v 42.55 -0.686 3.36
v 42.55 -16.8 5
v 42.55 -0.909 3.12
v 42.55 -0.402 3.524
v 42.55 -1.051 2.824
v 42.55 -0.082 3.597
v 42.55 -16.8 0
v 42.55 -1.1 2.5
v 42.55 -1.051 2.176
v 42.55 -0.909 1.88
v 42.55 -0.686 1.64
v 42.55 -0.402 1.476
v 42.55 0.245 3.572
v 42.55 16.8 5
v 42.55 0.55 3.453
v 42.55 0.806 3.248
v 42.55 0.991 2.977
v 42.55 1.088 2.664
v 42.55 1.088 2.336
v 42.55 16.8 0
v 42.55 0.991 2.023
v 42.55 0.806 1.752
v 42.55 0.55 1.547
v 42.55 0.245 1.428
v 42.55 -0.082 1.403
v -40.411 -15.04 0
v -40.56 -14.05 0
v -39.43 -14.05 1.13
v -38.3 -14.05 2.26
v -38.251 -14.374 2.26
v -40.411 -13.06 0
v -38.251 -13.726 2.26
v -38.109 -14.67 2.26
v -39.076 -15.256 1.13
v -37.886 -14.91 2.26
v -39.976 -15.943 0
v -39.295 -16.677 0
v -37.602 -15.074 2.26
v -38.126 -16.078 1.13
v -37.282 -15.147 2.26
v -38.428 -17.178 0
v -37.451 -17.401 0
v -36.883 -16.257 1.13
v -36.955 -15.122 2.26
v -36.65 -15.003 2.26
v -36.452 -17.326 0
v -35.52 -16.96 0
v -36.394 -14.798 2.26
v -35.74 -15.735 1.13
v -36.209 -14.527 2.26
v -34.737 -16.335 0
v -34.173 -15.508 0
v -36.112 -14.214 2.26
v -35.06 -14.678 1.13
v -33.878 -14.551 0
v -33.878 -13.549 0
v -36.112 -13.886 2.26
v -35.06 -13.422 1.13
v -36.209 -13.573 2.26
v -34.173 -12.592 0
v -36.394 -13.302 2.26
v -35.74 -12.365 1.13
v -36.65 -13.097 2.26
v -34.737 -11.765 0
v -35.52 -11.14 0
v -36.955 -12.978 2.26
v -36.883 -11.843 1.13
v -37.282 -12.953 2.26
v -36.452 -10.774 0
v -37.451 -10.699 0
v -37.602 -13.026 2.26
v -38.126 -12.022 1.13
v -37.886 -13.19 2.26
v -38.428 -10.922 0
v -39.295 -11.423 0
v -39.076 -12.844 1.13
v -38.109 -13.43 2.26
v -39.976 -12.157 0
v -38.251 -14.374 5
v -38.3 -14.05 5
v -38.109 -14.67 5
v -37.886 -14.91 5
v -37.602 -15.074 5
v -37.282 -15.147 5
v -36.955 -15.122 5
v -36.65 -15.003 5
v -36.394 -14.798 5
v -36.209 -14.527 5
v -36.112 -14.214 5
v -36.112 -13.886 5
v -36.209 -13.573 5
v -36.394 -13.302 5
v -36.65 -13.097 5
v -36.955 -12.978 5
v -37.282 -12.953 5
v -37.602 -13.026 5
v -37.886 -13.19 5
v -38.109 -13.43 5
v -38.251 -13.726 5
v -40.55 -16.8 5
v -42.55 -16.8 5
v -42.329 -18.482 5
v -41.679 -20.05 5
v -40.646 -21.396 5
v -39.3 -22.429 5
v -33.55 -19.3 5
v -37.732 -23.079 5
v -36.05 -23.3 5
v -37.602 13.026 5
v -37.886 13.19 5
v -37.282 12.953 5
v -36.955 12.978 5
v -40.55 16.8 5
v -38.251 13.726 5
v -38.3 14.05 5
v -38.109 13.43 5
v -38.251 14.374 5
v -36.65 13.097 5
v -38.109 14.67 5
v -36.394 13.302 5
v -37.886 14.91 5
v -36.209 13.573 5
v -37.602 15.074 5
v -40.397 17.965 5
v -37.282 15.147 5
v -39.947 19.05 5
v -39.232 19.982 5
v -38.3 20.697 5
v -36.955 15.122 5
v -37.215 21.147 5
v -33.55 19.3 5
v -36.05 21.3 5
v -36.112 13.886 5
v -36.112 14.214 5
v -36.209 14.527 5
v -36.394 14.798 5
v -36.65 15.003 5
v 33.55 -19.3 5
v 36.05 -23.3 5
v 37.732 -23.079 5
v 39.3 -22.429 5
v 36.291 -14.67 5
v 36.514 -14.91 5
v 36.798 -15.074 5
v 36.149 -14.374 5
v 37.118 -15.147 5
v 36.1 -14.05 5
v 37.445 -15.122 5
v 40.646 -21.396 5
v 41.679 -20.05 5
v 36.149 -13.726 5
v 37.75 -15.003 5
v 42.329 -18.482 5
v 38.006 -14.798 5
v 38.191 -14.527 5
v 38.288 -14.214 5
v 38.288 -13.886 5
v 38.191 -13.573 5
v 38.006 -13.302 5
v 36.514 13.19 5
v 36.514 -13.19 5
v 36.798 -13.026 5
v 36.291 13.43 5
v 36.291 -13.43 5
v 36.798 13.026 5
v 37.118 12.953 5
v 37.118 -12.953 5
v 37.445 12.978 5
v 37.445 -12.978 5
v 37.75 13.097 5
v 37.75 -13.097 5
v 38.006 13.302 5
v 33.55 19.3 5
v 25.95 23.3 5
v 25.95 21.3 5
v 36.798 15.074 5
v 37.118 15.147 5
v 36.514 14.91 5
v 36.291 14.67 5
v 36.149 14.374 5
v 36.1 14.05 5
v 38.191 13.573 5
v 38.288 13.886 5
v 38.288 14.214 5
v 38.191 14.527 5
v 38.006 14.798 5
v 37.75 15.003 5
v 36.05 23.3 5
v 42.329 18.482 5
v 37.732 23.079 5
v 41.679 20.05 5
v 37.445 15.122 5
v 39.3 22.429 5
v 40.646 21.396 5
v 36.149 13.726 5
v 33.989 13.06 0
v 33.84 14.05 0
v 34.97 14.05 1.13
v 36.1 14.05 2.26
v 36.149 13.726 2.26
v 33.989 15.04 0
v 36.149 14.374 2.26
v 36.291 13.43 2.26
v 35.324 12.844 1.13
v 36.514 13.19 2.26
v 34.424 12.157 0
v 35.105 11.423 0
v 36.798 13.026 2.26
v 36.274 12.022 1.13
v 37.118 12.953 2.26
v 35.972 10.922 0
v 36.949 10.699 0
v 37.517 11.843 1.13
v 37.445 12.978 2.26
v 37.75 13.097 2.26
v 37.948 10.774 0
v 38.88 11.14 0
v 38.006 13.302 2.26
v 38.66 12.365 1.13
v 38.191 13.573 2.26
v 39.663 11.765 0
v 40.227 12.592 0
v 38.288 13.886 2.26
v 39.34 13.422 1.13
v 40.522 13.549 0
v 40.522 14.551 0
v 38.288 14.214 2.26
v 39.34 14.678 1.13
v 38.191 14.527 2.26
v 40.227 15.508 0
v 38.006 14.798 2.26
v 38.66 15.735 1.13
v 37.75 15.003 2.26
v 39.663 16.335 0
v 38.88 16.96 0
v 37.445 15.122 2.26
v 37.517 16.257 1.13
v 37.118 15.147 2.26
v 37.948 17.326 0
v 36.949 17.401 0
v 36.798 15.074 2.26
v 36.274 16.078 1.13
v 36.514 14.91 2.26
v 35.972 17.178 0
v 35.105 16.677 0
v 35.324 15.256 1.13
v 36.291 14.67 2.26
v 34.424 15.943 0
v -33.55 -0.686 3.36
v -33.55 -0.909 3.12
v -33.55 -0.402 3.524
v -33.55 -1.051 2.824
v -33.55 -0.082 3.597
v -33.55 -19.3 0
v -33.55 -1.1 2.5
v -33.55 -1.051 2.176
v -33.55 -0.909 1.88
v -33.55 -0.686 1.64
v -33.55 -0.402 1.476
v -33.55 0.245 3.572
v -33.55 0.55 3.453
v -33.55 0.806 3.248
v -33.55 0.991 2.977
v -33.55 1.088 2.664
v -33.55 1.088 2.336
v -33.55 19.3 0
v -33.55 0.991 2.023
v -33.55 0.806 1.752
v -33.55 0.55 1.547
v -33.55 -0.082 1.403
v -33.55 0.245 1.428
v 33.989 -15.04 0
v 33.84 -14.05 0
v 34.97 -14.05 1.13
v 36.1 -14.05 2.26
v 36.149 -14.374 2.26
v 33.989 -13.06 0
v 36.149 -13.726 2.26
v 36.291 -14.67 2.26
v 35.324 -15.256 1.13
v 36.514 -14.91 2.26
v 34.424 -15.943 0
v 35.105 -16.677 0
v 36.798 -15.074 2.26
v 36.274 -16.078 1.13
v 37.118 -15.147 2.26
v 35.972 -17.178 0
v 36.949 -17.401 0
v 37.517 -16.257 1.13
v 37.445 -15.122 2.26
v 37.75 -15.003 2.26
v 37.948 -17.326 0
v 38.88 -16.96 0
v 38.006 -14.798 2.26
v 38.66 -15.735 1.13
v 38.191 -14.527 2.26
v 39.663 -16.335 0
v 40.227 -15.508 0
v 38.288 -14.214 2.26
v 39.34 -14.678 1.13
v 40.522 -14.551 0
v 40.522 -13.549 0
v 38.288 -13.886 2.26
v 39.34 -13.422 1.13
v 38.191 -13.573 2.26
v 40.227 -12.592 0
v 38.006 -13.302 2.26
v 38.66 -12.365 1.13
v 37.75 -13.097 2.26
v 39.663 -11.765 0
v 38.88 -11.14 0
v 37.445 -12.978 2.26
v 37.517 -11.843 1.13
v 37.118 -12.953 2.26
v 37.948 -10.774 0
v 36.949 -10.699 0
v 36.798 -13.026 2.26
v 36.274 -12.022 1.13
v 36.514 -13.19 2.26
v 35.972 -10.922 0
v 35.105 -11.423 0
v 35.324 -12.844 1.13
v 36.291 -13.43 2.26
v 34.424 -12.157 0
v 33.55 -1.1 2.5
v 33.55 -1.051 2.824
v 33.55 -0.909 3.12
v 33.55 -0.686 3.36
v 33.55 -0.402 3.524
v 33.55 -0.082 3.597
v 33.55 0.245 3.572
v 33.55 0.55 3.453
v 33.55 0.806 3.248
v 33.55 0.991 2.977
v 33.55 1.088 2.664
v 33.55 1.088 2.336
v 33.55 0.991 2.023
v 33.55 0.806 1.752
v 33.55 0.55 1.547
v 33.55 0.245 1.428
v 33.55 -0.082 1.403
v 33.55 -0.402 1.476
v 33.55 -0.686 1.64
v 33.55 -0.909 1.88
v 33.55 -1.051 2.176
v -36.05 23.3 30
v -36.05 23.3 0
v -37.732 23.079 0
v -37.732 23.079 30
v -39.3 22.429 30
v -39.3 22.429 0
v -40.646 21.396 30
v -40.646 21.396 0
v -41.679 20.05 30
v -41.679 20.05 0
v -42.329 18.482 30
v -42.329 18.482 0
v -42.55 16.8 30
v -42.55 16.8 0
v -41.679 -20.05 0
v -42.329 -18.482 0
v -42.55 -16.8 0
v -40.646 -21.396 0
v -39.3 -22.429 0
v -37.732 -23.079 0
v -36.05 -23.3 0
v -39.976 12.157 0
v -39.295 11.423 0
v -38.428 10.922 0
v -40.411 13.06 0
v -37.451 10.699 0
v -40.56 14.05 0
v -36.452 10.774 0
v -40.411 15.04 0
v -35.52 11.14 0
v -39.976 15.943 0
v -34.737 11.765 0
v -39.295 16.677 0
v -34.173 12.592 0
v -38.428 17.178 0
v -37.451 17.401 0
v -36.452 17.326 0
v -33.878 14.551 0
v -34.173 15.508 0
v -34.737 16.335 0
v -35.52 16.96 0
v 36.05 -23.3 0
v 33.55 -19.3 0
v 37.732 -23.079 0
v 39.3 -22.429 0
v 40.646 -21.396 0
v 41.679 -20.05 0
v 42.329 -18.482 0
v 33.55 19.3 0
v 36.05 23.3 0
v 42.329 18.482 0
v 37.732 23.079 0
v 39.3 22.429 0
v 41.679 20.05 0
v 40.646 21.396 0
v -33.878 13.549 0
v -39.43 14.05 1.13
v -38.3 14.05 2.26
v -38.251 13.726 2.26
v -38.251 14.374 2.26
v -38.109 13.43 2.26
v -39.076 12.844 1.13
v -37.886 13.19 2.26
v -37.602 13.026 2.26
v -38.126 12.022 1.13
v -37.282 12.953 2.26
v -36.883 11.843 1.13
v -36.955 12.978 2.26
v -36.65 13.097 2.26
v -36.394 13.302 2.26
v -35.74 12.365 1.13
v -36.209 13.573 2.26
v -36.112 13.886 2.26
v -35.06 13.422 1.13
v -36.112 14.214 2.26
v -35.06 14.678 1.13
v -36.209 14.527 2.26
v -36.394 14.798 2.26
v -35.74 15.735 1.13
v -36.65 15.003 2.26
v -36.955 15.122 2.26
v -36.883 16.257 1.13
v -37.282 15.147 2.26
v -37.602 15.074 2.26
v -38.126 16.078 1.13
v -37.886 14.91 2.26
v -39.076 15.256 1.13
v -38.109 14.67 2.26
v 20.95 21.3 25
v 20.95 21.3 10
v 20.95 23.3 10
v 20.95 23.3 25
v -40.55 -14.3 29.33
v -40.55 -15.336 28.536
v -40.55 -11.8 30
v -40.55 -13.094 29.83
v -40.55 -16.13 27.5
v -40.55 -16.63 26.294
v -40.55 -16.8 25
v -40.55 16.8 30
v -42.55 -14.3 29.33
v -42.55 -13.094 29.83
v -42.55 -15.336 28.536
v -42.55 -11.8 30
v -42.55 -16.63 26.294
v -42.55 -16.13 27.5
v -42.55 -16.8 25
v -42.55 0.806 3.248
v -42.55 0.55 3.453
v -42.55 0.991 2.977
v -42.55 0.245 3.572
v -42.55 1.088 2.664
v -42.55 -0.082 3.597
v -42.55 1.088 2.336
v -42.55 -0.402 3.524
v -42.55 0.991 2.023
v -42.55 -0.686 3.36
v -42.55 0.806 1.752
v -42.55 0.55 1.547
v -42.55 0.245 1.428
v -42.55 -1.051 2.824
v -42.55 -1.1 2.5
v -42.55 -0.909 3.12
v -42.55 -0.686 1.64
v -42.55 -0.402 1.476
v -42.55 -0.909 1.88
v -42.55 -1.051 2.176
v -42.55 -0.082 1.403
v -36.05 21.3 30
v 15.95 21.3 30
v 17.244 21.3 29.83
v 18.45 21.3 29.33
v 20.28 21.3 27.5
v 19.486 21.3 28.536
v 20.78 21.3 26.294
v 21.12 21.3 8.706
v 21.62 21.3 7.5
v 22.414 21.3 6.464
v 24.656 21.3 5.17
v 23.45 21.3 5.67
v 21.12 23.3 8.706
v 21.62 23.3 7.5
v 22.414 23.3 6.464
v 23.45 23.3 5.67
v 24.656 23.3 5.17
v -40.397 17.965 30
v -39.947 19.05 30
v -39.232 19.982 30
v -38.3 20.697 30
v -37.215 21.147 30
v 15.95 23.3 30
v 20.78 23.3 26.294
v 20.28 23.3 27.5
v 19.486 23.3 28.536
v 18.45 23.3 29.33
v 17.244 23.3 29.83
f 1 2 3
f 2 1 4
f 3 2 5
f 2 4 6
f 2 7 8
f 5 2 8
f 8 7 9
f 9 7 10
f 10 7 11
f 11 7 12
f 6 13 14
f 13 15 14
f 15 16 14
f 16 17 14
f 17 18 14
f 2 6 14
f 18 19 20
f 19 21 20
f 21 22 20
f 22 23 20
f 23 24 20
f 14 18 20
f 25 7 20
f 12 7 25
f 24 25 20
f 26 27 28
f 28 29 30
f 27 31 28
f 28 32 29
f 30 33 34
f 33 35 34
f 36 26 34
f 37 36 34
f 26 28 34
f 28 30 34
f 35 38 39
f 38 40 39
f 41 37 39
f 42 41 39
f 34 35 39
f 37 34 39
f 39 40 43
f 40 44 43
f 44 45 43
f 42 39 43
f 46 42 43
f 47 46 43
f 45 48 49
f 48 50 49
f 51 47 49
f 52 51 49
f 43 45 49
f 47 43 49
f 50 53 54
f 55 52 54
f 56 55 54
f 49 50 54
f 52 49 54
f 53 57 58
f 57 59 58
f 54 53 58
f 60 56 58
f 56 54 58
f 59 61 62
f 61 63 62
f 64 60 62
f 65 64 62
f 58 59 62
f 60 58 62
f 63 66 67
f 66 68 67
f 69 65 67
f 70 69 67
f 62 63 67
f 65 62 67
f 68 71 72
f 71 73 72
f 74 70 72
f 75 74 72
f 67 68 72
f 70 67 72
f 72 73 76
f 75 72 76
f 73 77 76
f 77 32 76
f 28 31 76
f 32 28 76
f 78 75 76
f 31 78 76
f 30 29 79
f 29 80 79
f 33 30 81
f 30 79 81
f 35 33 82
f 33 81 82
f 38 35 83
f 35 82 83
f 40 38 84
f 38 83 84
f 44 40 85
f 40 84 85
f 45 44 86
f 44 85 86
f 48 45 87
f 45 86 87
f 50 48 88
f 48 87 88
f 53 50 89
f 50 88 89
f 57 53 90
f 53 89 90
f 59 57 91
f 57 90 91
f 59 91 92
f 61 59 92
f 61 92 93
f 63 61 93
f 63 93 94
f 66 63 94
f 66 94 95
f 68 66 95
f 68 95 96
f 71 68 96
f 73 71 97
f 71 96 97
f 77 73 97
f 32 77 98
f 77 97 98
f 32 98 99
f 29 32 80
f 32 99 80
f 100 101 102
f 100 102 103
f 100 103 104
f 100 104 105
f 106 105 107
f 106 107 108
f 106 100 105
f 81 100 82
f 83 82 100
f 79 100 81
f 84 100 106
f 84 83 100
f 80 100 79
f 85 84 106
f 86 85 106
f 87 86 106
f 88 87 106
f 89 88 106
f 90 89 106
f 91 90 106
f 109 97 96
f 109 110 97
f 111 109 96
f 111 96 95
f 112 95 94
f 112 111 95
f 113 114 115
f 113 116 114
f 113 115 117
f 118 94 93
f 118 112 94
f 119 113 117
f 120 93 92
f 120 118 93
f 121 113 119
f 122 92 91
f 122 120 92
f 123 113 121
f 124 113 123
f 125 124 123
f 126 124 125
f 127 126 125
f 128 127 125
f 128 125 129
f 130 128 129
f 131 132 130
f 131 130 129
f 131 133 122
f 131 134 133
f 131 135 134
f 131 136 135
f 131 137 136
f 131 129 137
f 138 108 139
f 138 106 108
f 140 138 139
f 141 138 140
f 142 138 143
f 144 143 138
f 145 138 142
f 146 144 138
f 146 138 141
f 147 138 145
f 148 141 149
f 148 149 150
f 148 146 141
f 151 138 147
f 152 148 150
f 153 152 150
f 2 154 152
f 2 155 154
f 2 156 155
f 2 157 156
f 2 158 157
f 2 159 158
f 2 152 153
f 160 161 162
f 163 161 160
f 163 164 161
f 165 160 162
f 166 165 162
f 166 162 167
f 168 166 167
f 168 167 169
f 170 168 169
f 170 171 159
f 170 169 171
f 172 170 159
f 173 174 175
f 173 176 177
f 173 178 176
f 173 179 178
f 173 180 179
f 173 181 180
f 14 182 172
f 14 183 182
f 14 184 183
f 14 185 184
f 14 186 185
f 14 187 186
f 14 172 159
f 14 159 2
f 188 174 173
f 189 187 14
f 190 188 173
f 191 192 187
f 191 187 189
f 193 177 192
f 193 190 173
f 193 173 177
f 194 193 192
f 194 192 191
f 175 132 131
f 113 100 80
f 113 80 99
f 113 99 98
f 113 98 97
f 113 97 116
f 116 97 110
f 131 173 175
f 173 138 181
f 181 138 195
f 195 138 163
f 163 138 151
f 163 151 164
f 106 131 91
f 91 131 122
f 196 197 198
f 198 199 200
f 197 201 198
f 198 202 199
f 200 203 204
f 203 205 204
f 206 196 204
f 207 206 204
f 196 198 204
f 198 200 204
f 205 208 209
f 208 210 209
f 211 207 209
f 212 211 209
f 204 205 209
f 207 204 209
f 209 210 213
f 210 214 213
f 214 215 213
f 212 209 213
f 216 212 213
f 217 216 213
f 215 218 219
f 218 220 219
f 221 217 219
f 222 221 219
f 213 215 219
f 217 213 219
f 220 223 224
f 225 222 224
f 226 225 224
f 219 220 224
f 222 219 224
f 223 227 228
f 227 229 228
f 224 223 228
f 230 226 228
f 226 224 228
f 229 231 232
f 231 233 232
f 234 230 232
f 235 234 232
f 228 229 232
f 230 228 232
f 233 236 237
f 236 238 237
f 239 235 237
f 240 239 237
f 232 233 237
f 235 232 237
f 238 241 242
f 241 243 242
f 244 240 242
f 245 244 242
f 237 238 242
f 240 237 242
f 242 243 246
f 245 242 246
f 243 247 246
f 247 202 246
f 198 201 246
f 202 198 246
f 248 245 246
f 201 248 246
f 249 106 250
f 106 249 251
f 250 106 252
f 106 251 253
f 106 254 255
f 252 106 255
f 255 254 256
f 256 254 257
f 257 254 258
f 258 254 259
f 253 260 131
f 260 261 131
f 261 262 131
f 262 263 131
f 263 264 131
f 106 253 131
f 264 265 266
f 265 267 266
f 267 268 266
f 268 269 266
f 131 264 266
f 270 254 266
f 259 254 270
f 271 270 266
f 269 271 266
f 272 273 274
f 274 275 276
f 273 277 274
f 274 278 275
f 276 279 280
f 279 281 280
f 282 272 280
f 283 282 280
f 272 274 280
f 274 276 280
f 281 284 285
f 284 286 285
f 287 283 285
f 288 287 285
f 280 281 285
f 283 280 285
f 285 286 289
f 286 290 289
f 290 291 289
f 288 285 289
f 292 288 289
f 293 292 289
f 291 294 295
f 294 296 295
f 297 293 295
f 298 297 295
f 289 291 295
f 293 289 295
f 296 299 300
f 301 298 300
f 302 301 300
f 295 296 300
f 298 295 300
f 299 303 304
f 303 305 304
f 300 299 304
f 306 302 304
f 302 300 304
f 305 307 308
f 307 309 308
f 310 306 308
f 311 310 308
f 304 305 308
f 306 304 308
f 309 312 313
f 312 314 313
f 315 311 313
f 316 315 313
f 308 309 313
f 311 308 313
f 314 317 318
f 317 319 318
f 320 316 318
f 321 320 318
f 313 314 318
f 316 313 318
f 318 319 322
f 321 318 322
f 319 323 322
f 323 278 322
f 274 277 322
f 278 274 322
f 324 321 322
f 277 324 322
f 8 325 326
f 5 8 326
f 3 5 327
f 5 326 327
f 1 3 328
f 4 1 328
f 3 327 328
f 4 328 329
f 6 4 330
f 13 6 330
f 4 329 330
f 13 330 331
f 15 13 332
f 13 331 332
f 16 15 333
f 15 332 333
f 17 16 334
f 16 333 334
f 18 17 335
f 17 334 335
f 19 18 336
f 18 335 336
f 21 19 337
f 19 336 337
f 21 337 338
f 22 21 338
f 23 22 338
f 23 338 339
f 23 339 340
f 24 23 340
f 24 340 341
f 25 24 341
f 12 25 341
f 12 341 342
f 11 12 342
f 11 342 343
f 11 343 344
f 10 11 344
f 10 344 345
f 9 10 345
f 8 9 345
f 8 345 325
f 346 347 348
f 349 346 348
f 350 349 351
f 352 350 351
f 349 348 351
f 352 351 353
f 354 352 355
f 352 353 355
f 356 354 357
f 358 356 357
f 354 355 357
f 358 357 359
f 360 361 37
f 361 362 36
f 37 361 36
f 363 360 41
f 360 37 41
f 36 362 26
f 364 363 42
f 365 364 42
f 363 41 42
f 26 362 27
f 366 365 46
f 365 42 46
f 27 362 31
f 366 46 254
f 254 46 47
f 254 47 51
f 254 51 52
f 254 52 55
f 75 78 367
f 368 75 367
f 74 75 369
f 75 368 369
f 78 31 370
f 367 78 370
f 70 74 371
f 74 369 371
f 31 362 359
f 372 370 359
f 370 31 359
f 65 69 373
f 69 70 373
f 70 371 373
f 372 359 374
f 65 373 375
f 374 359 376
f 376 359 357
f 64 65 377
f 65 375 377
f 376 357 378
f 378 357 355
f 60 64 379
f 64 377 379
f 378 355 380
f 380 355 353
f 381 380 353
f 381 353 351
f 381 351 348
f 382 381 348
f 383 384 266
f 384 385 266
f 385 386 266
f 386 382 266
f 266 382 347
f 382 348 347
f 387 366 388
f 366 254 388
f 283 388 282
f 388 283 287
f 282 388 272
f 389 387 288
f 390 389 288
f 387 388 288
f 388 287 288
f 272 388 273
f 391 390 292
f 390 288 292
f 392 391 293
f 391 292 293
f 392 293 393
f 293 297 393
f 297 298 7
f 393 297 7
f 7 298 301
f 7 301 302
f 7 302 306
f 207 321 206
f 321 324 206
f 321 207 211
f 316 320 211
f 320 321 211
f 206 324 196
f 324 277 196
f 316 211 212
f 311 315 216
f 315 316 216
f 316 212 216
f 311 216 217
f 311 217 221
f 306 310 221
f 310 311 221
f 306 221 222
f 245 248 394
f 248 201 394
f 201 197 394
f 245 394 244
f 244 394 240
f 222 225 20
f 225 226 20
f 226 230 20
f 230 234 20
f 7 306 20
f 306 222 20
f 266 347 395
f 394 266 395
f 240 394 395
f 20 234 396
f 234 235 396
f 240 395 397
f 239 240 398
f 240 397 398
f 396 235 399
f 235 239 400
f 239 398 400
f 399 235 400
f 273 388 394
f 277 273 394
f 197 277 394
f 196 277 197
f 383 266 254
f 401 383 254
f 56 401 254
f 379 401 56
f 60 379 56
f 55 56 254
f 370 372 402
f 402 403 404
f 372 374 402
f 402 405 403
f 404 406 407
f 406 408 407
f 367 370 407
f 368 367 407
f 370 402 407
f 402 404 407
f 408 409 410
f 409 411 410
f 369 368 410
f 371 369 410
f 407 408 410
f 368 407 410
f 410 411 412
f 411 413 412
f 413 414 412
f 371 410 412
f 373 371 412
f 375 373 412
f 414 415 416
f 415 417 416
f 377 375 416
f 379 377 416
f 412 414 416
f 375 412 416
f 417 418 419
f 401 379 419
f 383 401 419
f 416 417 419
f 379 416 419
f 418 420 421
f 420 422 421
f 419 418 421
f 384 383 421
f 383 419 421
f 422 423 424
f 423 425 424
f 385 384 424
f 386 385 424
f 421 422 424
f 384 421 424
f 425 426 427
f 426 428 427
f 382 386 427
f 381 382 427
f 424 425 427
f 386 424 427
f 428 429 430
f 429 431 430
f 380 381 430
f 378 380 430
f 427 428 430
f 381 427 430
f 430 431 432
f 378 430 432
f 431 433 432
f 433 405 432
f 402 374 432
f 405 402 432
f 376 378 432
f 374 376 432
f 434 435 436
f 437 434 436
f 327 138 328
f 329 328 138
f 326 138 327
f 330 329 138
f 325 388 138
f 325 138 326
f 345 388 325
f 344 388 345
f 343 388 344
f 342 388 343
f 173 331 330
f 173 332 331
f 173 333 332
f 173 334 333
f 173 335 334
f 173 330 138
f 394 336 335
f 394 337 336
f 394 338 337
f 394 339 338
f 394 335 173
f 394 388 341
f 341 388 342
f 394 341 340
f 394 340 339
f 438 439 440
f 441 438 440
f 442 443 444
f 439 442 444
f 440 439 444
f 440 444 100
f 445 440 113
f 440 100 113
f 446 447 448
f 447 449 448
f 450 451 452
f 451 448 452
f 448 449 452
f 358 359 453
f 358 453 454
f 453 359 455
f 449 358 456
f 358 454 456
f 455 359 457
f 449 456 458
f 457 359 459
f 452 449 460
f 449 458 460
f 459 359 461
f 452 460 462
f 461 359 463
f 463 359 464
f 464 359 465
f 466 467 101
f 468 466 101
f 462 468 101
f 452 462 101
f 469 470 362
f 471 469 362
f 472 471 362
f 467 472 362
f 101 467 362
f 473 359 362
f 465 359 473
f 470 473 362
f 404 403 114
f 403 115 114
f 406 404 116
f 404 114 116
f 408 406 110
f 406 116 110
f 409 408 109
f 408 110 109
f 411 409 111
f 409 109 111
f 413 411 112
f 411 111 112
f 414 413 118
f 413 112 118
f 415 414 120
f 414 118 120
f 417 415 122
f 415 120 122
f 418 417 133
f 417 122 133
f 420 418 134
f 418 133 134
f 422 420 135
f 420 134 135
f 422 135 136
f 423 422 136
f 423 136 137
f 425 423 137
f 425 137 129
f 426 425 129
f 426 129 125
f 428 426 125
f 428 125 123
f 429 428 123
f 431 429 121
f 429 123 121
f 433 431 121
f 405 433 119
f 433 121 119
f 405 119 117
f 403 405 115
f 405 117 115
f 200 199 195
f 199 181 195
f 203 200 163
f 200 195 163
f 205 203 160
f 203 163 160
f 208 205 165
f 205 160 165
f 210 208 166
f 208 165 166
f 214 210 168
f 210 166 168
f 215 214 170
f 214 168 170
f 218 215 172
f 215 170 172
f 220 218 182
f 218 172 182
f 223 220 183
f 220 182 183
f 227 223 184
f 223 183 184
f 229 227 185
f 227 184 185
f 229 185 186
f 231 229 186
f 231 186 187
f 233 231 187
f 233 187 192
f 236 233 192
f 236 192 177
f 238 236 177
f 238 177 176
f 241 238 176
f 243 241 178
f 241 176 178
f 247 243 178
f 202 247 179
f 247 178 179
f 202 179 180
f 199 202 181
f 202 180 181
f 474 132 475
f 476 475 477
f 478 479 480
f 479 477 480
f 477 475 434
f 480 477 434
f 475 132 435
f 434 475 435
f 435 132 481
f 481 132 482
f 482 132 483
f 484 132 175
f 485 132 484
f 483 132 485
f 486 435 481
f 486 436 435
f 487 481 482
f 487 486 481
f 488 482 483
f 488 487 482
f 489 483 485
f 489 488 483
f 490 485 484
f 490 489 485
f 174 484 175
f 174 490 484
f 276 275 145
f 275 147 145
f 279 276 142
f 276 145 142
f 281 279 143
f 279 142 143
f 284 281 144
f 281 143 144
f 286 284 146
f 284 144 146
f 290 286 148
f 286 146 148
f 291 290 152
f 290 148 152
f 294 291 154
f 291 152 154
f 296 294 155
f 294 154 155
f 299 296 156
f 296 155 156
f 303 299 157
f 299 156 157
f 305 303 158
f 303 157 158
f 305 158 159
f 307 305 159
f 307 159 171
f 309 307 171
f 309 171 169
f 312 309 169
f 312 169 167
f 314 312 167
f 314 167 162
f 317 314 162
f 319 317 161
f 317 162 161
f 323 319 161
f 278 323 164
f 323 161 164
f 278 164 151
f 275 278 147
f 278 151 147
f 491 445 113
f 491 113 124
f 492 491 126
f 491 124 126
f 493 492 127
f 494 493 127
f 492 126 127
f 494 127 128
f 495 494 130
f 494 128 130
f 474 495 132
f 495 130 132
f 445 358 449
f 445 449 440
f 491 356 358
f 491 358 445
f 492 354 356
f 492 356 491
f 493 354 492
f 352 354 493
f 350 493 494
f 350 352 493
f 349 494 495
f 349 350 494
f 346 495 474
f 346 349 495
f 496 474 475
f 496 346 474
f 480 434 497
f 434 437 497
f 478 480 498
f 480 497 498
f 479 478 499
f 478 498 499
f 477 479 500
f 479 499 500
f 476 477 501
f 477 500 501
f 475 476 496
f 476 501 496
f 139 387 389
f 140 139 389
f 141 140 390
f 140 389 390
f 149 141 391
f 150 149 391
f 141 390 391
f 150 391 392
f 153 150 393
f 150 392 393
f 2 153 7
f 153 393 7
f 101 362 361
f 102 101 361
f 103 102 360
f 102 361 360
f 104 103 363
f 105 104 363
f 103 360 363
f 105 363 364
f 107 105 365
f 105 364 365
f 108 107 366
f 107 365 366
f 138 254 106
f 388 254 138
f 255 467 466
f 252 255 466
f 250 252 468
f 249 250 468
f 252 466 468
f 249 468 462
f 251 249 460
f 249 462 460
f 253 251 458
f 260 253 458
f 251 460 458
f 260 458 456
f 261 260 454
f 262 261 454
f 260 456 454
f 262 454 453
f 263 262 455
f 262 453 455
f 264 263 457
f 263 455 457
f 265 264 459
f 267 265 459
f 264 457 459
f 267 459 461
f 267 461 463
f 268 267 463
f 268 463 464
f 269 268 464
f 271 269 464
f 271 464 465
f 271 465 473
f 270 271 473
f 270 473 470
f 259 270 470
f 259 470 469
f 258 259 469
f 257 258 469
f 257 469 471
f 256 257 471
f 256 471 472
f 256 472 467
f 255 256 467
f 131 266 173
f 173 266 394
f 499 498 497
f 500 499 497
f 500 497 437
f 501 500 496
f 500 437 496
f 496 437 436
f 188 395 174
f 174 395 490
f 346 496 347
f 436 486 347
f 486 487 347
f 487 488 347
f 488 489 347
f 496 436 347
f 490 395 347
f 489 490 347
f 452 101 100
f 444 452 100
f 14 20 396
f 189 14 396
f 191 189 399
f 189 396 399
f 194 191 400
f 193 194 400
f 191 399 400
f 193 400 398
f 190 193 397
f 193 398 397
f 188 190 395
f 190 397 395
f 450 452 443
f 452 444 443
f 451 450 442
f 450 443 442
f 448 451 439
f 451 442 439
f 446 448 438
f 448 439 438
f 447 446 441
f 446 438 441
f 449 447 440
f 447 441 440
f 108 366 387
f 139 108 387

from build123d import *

# Parameters (mm, degrees)
F0_W           = 67.1
F0_H           = 38.6
F1_DEPTH       = 5
F2_DEPTH       = 5
F3_D           = 2.2
F3_CSINK_D     = 6.72
F3_CSINK_ANGLE = 90
F5_D           = 2.2
F7_DEPTH       = 25
F8_R           = 5


with BuildPart() as f1:
    # F0 (on Top) → F1 (new body)
    with BuildSketch(Plane.XY):
        with BuildLine():
            ThreePointArc((40.55, 16.8), (39.231981, 19.981981), (36.05, 21.3))
            Line((36.05, 21.3), (-36.05, 21.3))
            ThreePointArc((-36.05, 21.3), (-39.231981, 19.981981), (-40.55, 16.8))
            Line((-40.55, 16.8), (-40.55, -16.8))
            ThreePointArc((-40.55, -16.8), (-39.231981, -19.981981), (-36.05, -21.3))
            Line((-36.05, -21.3), (-14.45, -21.3))
            Line((-14.45, -21.3), (36.05, -21.3))
            ThreePointArc((36.05, -21.3), (39.231981, -19.981981), (40.55, -16.8))
            Line((40.55, -16.8), (40.55, 16.8))
        make_face()
        Rectangle(F0_W, F0_H, mode=Mode.SUBTRACT)
    extrude(amount=F1_DEPTH)

    # F0 (on Top) → F2 (join)
    with BuildSketch(Plane.XY):
        with BuildLine():
            Line((-36.05, 21.3), (36.05, 21.3))
            ThreePointArc((36.05, 21.3), (39.231981, 19.981981), (40.55, 16.8))
            Line((40.55, 16.8), (42.55, 16.8))
            ThreePointArc((42.55, 16.8), (40.646194, 21.396194), (36.05, 23.3))
            Line((36.05, 23.3), (-36.05, 23.3))
            ThreePointArc((-36.05, 23.3), (-40.646194, 21.396194), (-42.55, 16.8))
            Line((-42.55, 16.8), (-42.55, -16.8))
            ThreePointArc((-42.55, -16.8), (-40.646194, -21.396194), (-36.05, -23.3))
            Line((-36.05, -23.3), (-14.45, -23.3))
            Line((-14.45, -23.3), (-14.45, -21.3))
            Line((-14.45, -21.3), (-36.05, -21.3))
            ThreePointArc((-36.05, -21.3), (-39.231981, -19.981981), (-40.55, -16.8))
            Line((-40.55, -16.8), (-40.55, 16.8))
            ThreePointArc((-40.55, 16.8), (-39.231981, 19.981981), (-36.05, 21.3))
        make_face()
        with BuildLine():
            Line((42.55, 16.8), (40.55, 16.8))
            Line((40.55, 16.8), (40.55, -16.8))
            ThreePointArc((40.55, -16.8), (39.231981, -19.981981), (36.05, -21.3))
            Line((36.05, -21.3), (-14.45, -21.3))
            Line((-14.45, -21.3), (-14.45, -23.3))
            Line((-14.45, -23.3), (36.05, -23.3))
            ThreePointArc((36.05, -23.3), (40.646194, -21.396194), (42.55, -16.8))
            Line((42.55, -16.8), (42.55, 16.8))
        make_face()
    extrude(amount=F2_DEPTH)

    # F3 (through all)
    with Locations(Plane(origin=(0, 0, 0), x_dir=(1, 0, 0), z_dir=(0, 0, -1))):
        with Locations((37.2, 14.05), (37.2, -14.05), (-37.2, -14.05), (-37.2, 14.05)):
            CounterSinkHole(F3_D / 2, F3_CSINK_D / 2, counter_sink_angle=F3_CSINK_ANGLE)

    # F5 (through all)
    with Locations(Plane.YZ.offset(42.55)):
        with Locations((0, 2.5)):
            Hole(F5_D / 2)

    # F6 (on face) → F7 (join)
    with BuildSketch(Plane.XY.offset(5)):
        with BuildLine():
            Line((-42.55, 16.8), (-42.55, -16.8))
            Line((-42.55, -16.8), (-40.55, -16.8))
            Line((-40.55, -16.8), (-40.55, 16.8))
            ThreePointArc((-40.55, 16.8), (-39.231981, 19.981981), (-36.05, 21.3))
            Line((-36.05, 21.3), (20.95, 21.3))
            Line((20.95, 21.3), (20.95, 23.3))
            Line((20.95, 23.3), (-36.05, 23.3))
            ThreePointArc((-36.05, 23.3), (-40.646194, 21.396194), (-42.55, 16.8))
        make_face()
    extrude(amount=F7_DEPTH)

    # F8
    f8_edges = [f1.edges().sort_by_distance(p)[0] for p in [
        (-41.55, -16.8, 30),
        (20.95, 22.3, 30),
        (20.95, 22.3, 5),
    ]]
    fillet(f8_edges, radius=F8_R)


solid = f1.part
